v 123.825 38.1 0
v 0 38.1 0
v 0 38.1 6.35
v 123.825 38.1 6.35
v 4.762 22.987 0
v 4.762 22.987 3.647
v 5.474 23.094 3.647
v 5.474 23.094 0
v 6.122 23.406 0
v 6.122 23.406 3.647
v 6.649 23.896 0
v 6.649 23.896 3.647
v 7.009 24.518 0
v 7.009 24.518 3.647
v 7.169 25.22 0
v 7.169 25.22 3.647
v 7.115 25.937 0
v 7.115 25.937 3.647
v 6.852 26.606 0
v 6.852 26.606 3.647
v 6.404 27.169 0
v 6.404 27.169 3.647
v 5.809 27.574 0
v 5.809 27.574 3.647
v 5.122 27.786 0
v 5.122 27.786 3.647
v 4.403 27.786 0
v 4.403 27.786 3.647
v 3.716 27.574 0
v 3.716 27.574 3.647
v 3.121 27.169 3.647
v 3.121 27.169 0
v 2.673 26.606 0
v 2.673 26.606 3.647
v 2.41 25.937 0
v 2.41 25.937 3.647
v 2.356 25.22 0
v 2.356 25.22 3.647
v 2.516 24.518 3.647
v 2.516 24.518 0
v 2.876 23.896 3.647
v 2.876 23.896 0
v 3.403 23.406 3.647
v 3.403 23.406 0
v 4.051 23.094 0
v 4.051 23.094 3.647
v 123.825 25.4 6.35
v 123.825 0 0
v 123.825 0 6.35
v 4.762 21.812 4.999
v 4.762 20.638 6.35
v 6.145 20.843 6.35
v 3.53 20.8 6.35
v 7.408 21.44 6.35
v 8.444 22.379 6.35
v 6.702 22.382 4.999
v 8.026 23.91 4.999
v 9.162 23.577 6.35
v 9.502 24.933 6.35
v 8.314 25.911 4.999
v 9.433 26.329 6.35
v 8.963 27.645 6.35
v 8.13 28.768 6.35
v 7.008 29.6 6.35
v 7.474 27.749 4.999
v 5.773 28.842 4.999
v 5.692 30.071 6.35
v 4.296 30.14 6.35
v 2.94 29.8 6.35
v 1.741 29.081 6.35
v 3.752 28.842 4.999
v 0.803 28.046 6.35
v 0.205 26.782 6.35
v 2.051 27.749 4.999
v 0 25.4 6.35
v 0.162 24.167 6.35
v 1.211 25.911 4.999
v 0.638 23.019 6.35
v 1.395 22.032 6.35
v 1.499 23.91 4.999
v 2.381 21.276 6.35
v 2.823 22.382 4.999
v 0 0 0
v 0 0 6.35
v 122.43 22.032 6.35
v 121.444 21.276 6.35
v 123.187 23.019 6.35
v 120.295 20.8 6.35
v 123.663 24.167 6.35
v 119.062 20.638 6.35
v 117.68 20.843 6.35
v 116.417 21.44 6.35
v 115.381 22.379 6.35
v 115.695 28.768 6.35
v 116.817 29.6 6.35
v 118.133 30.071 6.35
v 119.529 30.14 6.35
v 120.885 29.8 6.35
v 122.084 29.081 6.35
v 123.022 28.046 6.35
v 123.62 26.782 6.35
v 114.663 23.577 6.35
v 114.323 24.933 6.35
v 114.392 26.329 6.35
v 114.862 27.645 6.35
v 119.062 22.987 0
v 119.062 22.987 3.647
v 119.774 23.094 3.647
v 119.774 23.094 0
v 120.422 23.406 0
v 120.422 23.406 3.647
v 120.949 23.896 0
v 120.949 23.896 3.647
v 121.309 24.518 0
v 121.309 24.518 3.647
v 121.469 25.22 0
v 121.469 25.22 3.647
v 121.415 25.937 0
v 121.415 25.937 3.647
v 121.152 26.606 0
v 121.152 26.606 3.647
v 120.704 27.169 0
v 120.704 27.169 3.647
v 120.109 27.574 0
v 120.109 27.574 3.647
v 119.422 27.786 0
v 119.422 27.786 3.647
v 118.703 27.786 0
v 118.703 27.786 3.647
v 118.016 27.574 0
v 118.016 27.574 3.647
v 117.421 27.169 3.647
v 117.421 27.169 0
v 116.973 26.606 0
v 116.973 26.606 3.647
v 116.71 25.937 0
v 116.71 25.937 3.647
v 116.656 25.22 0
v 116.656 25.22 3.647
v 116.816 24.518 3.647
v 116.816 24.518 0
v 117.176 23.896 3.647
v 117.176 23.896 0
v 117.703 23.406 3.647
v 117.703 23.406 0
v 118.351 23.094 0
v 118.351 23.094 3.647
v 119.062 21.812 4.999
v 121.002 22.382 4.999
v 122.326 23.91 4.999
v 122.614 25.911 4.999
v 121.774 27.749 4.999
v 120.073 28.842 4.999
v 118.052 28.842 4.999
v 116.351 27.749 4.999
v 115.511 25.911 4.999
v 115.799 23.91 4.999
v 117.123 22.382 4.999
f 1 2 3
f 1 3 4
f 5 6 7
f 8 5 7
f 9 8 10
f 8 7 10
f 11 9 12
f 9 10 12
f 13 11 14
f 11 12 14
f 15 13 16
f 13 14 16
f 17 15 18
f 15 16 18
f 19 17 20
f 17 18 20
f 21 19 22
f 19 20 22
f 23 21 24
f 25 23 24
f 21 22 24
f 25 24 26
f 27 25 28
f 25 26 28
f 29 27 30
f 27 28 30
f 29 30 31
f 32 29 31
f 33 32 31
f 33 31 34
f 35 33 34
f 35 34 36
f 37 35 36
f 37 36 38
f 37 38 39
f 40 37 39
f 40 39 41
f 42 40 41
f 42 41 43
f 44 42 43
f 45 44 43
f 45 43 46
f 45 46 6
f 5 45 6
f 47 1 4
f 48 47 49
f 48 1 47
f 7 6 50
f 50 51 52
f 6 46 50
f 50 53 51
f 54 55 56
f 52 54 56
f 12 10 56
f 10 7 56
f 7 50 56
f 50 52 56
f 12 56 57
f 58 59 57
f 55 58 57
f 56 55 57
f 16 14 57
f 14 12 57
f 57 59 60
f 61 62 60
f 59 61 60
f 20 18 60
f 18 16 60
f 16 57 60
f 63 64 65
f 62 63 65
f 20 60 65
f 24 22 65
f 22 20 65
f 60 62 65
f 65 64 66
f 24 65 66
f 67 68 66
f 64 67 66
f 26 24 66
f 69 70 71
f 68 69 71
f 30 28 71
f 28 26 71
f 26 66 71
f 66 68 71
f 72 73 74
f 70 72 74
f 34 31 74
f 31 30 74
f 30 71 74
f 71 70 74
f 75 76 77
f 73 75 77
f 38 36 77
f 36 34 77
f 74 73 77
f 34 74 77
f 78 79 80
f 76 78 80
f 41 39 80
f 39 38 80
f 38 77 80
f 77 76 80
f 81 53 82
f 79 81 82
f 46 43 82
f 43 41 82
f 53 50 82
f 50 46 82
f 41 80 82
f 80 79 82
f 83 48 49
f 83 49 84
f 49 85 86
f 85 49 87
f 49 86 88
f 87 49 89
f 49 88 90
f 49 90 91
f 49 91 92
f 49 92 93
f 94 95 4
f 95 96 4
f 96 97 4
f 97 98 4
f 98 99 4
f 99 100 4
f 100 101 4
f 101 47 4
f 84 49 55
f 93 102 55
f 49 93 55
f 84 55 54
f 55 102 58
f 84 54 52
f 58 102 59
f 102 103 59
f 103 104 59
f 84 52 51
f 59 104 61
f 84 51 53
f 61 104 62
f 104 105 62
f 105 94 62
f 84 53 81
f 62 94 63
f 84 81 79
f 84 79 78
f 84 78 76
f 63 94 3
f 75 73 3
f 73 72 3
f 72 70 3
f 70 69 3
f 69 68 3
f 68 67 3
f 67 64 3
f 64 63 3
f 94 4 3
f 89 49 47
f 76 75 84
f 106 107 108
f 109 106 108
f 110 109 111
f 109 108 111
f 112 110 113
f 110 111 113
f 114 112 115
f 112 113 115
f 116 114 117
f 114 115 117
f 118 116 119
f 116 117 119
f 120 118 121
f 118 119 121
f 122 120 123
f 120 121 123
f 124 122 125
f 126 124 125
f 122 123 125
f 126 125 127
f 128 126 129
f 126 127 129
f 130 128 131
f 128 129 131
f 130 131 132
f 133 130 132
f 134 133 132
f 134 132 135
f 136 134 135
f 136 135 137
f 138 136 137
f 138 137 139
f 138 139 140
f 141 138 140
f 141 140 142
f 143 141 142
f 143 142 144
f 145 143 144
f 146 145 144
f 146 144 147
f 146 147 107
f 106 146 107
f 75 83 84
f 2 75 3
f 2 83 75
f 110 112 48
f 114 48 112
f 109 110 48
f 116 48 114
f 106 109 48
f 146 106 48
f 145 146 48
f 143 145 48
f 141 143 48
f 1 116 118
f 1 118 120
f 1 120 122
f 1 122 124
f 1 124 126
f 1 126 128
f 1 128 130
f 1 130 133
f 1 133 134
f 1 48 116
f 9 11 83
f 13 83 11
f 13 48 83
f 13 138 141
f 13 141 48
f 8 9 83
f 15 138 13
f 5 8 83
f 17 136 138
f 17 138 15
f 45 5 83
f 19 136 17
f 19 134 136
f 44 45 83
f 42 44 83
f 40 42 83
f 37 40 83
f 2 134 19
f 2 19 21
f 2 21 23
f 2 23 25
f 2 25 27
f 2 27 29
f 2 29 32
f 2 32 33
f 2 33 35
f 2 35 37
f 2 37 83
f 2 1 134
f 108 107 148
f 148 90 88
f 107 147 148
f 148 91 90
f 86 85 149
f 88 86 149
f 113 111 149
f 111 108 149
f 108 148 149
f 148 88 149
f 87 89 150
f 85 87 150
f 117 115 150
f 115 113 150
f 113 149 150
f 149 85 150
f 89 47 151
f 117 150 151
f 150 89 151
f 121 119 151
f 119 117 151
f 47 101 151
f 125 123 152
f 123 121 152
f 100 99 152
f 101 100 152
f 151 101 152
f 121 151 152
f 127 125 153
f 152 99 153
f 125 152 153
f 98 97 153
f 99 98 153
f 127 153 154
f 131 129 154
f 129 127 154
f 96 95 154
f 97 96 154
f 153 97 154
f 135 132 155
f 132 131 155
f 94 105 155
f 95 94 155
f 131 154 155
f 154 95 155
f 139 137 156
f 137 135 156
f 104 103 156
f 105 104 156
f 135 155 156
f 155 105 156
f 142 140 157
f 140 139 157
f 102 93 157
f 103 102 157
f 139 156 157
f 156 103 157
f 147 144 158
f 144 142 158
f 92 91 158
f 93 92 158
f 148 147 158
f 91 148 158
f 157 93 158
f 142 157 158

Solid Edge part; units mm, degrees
sketch "Sketch1" plane through (0, 0, 0) normal (0, 0, 1) x (1, 0, 0)
  line L0 (0, 0) -> (0, 38.1)
  line L1 (0, 38.1) -> (123.825, 38.1)
  line L2 (123.825, 38.1) -> (123.825, 0)
  line L3 (123.825, 0) -> (0, 0)
  dimension "D1" = 123.825
  dimension "D2" = 38.1
extrude "Protrusion1" add sketch "Sketch1" along normal blind 6.35
hole "Hole_1" at (119.0625, 25.4, 6.35) direction (0, 0, -1) diameter 4.826 end up to next countersink diameter 9.525 countersink angle 82
hole "Hole1" at (4.7625, 25.4, 6.35) direction (0, 0, -1) diameter 4.826 end up to next countersink diameter 9.525 countersink angle 82
properties part number "CHAS-03"
